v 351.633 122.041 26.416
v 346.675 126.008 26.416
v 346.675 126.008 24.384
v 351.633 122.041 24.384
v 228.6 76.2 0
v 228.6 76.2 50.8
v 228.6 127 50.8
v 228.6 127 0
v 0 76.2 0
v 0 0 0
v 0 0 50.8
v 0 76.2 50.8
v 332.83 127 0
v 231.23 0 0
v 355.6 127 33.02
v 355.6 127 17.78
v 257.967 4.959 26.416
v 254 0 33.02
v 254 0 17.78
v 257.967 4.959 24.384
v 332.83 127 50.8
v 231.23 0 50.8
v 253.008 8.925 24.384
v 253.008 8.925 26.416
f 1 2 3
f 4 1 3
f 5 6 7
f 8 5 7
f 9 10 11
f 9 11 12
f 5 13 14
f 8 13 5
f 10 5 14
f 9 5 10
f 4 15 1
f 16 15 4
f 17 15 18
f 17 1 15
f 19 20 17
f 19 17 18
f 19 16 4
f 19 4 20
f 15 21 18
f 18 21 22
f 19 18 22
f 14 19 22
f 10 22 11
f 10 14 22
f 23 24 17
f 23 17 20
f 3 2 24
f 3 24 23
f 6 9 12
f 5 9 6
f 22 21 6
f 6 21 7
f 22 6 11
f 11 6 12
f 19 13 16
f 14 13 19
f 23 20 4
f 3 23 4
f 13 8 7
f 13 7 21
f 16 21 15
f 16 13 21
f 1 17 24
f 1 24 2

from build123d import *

# Parameters (mm, degrees)
BOSS_EXTRUDE1_DEPTH = 50.8
CHAMFER2_SIZE       = 17.78
CHAMFER3_SIZE       = 17.78
SKETCH8_W           = 2.032
SKETCH8_H           = 149.939355631
CUT_EXTRUDE3_DEPTH  = 6.35


with BuildPart() as part:
    # Sketch6 → Boss-Extrude1 (new body)
    with BuildSketch(Plane.XY):
        Polygon((0, 0), (0, 76.2), (228.6, 76.2), (228.6, 127), (355.6, 127), (254, 0), align=None)
    extrude(amount=BOSS_EXTRUDE1_DEPTH)

    # Chamfer2
    chamfer2_edges = [part.edges().sort_by_distance(p)[0] for p in [
        (304.8, 63.5, 50.8),
    ]]
    chamfer(chamfer2_edges, length=CHAMFER2_SIZE)

    # Chamfer3
    chamfer3_edges = [part.edges().sort_by_distance(p)[0] for p in [
        (304.8, 63.5, 0),
    ]]
    chamfer(chamfer3_edges, length=CHAMFER3_SIZE)

    # Sketch8 → Cut-Extrude3 (cut)
    with BuildSketch(Plane(origin=(154.87804878, -123.902439024, 0), x_dir=(0, 0, -1), z_dir=(0.7808688094430302, -0.6246950475544245, 0))):
        with Locations((-25.4, 239.992219895)):
            Rectangle(SKETCH8_W, SKETCH8_H)
    extrude(amount=-CUT_EXTRUDE3_DEPTH, mode=Mode.SUBTRACT)


solid = part.part
